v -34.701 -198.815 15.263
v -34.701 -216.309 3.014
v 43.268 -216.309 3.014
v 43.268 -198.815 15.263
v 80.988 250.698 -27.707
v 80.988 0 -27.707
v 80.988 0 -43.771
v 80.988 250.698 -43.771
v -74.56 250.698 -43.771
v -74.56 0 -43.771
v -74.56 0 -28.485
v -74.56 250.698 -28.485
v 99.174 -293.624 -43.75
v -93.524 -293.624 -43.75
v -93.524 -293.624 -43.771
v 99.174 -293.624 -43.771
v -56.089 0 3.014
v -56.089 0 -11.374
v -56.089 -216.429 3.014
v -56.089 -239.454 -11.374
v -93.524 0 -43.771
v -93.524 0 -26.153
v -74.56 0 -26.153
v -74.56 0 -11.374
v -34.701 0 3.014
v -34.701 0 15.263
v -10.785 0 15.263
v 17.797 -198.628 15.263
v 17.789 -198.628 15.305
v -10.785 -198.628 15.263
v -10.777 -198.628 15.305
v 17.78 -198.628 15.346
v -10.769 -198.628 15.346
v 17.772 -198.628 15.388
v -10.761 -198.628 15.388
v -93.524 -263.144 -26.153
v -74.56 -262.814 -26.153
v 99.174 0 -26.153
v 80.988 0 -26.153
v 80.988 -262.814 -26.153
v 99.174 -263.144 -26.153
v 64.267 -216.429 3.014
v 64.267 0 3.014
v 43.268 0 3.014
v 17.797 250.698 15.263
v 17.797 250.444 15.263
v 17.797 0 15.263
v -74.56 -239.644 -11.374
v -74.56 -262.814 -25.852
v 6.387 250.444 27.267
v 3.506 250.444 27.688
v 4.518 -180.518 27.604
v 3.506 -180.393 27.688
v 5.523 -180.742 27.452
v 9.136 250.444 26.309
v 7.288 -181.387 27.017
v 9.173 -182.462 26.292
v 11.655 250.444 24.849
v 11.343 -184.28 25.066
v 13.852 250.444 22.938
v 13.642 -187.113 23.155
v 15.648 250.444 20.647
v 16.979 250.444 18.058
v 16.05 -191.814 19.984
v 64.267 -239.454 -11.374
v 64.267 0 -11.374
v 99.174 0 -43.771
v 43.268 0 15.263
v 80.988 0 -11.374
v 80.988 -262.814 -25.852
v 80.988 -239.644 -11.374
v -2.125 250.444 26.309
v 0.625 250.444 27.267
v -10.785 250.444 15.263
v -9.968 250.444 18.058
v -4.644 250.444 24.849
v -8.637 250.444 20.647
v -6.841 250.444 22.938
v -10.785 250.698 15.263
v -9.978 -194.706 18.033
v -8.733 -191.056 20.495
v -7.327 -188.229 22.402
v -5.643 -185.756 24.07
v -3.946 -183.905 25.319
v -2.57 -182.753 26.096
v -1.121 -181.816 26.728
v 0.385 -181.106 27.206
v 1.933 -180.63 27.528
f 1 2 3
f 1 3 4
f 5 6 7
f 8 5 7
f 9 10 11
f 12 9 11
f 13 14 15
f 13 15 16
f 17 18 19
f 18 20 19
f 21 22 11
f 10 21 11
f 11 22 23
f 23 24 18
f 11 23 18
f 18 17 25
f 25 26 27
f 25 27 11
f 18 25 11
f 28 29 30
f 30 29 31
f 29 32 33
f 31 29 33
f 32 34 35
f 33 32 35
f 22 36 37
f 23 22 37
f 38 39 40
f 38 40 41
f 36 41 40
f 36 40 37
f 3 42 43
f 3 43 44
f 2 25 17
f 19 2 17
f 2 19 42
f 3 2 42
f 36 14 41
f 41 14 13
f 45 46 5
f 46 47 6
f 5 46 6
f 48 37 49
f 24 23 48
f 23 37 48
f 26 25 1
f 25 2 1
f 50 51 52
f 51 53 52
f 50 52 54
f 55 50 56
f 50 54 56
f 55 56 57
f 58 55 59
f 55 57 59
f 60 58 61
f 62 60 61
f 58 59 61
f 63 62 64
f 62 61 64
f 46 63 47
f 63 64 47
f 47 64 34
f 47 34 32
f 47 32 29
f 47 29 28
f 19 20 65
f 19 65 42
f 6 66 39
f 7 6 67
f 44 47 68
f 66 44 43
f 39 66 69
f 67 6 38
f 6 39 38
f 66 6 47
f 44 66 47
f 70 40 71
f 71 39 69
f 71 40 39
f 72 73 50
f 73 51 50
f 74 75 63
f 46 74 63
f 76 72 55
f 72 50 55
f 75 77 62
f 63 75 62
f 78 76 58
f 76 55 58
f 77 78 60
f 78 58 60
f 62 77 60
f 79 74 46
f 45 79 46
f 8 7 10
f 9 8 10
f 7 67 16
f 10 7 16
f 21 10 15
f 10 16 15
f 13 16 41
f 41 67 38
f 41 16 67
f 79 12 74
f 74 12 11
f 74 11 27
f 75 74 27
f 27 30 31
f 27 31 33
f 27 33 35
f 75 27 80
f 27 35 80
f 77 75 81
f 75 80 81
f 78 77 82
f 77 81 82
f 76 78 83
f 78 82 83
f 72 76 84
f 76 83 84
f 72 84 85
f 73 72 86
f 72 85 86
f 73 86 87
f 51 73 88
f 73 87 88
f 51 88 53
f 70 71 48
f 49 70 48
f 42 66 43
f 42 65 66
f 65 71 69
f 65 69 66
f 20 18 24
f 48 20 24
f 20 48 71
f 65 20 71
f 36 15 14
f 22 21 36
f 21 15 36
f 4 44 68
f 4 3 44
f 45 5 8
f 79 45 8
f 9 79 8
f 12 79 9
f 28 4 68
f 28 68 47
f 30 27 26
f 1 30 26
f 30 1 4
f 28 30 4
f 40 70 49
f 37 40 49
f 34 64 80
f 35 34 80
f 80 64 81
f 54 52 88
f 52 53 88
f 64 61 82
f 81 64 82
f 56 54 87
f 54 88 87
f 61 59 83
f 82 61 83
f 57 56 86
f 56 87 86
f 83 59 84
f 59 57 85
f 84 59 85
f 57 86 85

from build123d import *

# Parameters (mm, degrees)
F0_W         = 192.698314786
F0_H         = 17.6181327552
F1_DEPTH     = 293.624
F2_SIZE2     = 17.5976362049
F2_SIZE      = 30.48
F3_W         = 155.5479988456
F3_H         = 14.7782256827
F4_DEPTH     = 262.8138
F5_SIZE2     = 23.1696433115
F5_SIZE      = 14.478
F6_W         = 120.3552596271
F6_H         = 14.3881891854
F7_DEPTH     = 239.5982
F8_T4_DEPTH  = 240.1584395307
F9_W         = 77.968429774
F9_H         = 12.2494040988
F10_DEPTH    = 216.408
F11_T4_DEPTH = 168.8399476849
F12_W        = 28.5819442943
F12_H        = 12.4438395724
F13_DEPTH    = 198.628
F14_SIZE2    = 18.2636685711
F14_SIZE     = 12.319
F15_T1_DEPTH = 255.6446994283
F17_DEPTH    = 250.698
F18_DEPTH    = 250.444


# Not quite as in the source:
# - a fillet or chamfer that OpenCascade refuses, or shapes differently, is made with other operations: its cross-section is extruded or revolved along the edge and cut away or added


with BuildPart() as f1:
    # F0 (on Front) → F1 (new body)
    with BuildSketch(Plane.XZ):
        with Locations((2.8250664473, -34.9617386237)):
            Rectangle(F0_W, F0_H)
    extrude(amount=F1_DEPTH)

    # F2
    f2_edges = [f1.edges().sort_by_distance(p)[0] for p in [
        (2.825066, -293.624, -26.152672),
    ]]
    f2_side = f1.faces().sort_by_distance((2.825066, -146.812, -26.152672))[0]
    chamfer(f2_edges, length=F2_SIZE, length2=F2_SIZE2, reference=f2_side)

    # F3 (on face) → F4 (join)
    with BuildSketch(Plane(origin=(0, 0, 0), x_dir=(-1, 0, 0), z_dir=(0, 1, 0))):
        with Locations((-3.2139383256, -18.7635594048)):
            Rectangle(F3_W, F3_H)
    extrude(amount=-F4_DEPTH)

    # F5
    f5_edges = [f1.edges().sort_by_distance(p)[0] for p in [
        (3.213938, -262.8138, -11.374447),
    ]]
    f5_side = f1.faces().sort_by_distance((3.213938, -262.8138, -18.763559))[0]
    chamfer(f5_edges, length=F5_SIZE, length2=F5_SIZE2, reference=f5_side)

    # F6 (on face) → F7 (join)
    with BuildSketch(Plane(origin=(0, 0, 0), x_dir=(-1, 0, 0), z_dir=(0, 1, 0))):
        with Locations((-4.0888953954, -4.1803519707)):
            Rectangle(F6_W, F6_H)
    extrude(amount=-F7_DEPTH)

    # F8: chamfer of 14.478 x 23.1696433115 on 1 edges, made by hand


with BuildPart() as f8_tool2:
    # F8_s3 → F8_t4 (new body)
    with BuildSketch(Plane.YZ.offset(-115.99032437)):
        Polygon((-239.5982, -11.464257378), (-216.4285566885, 3.013742622), (-239.5982, 3.013742622), align=None)
    extrude(amount=F8_T4_DEPTH)

    split(bisect_by=Plane.XY.offset(-11.3744465634), keep=Keep.TOP)


with BuildPart() as f1_1:
    add(f1.part)

    # F8_t1: cut F8_tool2
    add(f8_tool2.part, mode=Mode.SUBTRACT)

    # F9 (on face) → F10 (join)
    with BuildSketch(Plane(origin=(0, 0, 0), x_dir=(-1, 0, 0), z_dir=(0, 1, 0))):
        with Locations((-4.2833294719, 9.1384446714)):
            Rectangle(F9_W, F9_H)
    extrude(amount=-F10_DEPTH)

    # F11: chamfer of 12.319 x 17.5933552951 on 1 edges, made by hand


with BuildPart() as f11_tool2:
    # F11_s3 → F11_t4 (new body)
    with BuildSketch(Plane.YZ.offset(-80.1366443705)):
        Polygon((-216.408, 2.9441467208), (-198.8146447049, 15.2631467208), (-216.408, 15.2631467208), align=None)
    extrude(amount=F11_T4_DEPTH)

    split(bisect_by=Plane.XY.offset(3.013742622), keep=Keep.TOP)


with BuildPart() as f1_2:
    add(f1_1.part)

    # F11_t1: cut F11_tool2
    add(f11_tool2.part, mode=Mode.SUBTRACT)

    # F12 (on face) → F13 (join)
    with BuildSketch(Plane(origin=(0, 0, 0), x_dir=(-1, 0, 0), z_dir=(0, 1, 0))):
        with Locations((-3.5055889748, 21.485066507)):
            Rectangle(F12_W, F12_H)
    extrude(amount=-F13_DEPTH)

    # F14
    f14_edges = [f1_2.edges().sort_by_distance(p)[0] for p in [
        (3.505589, -198.628, 27.706986),
    ]]
    f14_side = f1_2.faces().sort_by_distance((3.505589, -198.628, 21.485067))[0]
    chamfer(f14_edges, length=F14_SIZE, length2=F14_SIZE2, reference=f14_side)

    # F15: fillet of radius 15.3302561211 on 2 edges, made by hand

    # F15_s2 → F15_t1 (cut)
    with BuildSketch(Plane.XZ.offset(-37.6401839997)):
        with BuildLine():
            ThreePointArc((2.7404875221, 27.7069862932), (12.5069415299, 24.1933764328), (17.7965611219, 15.2631467208))
            Line((17.7965611219, 15.2631467208), (17.7965611219, 27.7069862932))
            Line((17.7965611219, 27.7069862932), (2.7404875221, 27.7069862932))
        make_face()
        with BuildLine():
            ThreePointArc((-10.7853831723, 15.2631467208), (-5.4957635803, 24.1933764328), (4.2706904276, 27.7069862932))
            Line((4.2706904276, 27.7069862932), (-10.7853831723, 27.7069862932))
            Line((-10.7853831723, 27.7069862932), (-10.7853831723, 15.2631467208))
        make_face()
    extrude(amount=F15_T1_DEPTH, mode=Mode.SUBTRACT)

    # F16 (on face) → F17 (join)
    with BuildSketch(Plane(origin=(0, 0, 0), x_dir=(-1, 0, 0), z_dir=(0, 1, 0))):
        Polygon((-80.9879377484, -27.7069862932), (-80.9879377484, -43.7708050013), (74.5600610971, -43.7708050013), (74.5600610971, -28.4847263247), (10.7853831723, 15.2631467208), (-17.7965611219, 15.2631467208), align=None)
    extrude(amount=F17_DEPTH)

    # F18 (add): a face of the model
    f18_faces = [f1_2.faces().sort_by_distance(p)[0] for p in [
        (3.5055889748, 0, 20.394937783),
    ]]
    extrude(f18_faces, amount=F18_DEPTH)


solid = f1_2.part
